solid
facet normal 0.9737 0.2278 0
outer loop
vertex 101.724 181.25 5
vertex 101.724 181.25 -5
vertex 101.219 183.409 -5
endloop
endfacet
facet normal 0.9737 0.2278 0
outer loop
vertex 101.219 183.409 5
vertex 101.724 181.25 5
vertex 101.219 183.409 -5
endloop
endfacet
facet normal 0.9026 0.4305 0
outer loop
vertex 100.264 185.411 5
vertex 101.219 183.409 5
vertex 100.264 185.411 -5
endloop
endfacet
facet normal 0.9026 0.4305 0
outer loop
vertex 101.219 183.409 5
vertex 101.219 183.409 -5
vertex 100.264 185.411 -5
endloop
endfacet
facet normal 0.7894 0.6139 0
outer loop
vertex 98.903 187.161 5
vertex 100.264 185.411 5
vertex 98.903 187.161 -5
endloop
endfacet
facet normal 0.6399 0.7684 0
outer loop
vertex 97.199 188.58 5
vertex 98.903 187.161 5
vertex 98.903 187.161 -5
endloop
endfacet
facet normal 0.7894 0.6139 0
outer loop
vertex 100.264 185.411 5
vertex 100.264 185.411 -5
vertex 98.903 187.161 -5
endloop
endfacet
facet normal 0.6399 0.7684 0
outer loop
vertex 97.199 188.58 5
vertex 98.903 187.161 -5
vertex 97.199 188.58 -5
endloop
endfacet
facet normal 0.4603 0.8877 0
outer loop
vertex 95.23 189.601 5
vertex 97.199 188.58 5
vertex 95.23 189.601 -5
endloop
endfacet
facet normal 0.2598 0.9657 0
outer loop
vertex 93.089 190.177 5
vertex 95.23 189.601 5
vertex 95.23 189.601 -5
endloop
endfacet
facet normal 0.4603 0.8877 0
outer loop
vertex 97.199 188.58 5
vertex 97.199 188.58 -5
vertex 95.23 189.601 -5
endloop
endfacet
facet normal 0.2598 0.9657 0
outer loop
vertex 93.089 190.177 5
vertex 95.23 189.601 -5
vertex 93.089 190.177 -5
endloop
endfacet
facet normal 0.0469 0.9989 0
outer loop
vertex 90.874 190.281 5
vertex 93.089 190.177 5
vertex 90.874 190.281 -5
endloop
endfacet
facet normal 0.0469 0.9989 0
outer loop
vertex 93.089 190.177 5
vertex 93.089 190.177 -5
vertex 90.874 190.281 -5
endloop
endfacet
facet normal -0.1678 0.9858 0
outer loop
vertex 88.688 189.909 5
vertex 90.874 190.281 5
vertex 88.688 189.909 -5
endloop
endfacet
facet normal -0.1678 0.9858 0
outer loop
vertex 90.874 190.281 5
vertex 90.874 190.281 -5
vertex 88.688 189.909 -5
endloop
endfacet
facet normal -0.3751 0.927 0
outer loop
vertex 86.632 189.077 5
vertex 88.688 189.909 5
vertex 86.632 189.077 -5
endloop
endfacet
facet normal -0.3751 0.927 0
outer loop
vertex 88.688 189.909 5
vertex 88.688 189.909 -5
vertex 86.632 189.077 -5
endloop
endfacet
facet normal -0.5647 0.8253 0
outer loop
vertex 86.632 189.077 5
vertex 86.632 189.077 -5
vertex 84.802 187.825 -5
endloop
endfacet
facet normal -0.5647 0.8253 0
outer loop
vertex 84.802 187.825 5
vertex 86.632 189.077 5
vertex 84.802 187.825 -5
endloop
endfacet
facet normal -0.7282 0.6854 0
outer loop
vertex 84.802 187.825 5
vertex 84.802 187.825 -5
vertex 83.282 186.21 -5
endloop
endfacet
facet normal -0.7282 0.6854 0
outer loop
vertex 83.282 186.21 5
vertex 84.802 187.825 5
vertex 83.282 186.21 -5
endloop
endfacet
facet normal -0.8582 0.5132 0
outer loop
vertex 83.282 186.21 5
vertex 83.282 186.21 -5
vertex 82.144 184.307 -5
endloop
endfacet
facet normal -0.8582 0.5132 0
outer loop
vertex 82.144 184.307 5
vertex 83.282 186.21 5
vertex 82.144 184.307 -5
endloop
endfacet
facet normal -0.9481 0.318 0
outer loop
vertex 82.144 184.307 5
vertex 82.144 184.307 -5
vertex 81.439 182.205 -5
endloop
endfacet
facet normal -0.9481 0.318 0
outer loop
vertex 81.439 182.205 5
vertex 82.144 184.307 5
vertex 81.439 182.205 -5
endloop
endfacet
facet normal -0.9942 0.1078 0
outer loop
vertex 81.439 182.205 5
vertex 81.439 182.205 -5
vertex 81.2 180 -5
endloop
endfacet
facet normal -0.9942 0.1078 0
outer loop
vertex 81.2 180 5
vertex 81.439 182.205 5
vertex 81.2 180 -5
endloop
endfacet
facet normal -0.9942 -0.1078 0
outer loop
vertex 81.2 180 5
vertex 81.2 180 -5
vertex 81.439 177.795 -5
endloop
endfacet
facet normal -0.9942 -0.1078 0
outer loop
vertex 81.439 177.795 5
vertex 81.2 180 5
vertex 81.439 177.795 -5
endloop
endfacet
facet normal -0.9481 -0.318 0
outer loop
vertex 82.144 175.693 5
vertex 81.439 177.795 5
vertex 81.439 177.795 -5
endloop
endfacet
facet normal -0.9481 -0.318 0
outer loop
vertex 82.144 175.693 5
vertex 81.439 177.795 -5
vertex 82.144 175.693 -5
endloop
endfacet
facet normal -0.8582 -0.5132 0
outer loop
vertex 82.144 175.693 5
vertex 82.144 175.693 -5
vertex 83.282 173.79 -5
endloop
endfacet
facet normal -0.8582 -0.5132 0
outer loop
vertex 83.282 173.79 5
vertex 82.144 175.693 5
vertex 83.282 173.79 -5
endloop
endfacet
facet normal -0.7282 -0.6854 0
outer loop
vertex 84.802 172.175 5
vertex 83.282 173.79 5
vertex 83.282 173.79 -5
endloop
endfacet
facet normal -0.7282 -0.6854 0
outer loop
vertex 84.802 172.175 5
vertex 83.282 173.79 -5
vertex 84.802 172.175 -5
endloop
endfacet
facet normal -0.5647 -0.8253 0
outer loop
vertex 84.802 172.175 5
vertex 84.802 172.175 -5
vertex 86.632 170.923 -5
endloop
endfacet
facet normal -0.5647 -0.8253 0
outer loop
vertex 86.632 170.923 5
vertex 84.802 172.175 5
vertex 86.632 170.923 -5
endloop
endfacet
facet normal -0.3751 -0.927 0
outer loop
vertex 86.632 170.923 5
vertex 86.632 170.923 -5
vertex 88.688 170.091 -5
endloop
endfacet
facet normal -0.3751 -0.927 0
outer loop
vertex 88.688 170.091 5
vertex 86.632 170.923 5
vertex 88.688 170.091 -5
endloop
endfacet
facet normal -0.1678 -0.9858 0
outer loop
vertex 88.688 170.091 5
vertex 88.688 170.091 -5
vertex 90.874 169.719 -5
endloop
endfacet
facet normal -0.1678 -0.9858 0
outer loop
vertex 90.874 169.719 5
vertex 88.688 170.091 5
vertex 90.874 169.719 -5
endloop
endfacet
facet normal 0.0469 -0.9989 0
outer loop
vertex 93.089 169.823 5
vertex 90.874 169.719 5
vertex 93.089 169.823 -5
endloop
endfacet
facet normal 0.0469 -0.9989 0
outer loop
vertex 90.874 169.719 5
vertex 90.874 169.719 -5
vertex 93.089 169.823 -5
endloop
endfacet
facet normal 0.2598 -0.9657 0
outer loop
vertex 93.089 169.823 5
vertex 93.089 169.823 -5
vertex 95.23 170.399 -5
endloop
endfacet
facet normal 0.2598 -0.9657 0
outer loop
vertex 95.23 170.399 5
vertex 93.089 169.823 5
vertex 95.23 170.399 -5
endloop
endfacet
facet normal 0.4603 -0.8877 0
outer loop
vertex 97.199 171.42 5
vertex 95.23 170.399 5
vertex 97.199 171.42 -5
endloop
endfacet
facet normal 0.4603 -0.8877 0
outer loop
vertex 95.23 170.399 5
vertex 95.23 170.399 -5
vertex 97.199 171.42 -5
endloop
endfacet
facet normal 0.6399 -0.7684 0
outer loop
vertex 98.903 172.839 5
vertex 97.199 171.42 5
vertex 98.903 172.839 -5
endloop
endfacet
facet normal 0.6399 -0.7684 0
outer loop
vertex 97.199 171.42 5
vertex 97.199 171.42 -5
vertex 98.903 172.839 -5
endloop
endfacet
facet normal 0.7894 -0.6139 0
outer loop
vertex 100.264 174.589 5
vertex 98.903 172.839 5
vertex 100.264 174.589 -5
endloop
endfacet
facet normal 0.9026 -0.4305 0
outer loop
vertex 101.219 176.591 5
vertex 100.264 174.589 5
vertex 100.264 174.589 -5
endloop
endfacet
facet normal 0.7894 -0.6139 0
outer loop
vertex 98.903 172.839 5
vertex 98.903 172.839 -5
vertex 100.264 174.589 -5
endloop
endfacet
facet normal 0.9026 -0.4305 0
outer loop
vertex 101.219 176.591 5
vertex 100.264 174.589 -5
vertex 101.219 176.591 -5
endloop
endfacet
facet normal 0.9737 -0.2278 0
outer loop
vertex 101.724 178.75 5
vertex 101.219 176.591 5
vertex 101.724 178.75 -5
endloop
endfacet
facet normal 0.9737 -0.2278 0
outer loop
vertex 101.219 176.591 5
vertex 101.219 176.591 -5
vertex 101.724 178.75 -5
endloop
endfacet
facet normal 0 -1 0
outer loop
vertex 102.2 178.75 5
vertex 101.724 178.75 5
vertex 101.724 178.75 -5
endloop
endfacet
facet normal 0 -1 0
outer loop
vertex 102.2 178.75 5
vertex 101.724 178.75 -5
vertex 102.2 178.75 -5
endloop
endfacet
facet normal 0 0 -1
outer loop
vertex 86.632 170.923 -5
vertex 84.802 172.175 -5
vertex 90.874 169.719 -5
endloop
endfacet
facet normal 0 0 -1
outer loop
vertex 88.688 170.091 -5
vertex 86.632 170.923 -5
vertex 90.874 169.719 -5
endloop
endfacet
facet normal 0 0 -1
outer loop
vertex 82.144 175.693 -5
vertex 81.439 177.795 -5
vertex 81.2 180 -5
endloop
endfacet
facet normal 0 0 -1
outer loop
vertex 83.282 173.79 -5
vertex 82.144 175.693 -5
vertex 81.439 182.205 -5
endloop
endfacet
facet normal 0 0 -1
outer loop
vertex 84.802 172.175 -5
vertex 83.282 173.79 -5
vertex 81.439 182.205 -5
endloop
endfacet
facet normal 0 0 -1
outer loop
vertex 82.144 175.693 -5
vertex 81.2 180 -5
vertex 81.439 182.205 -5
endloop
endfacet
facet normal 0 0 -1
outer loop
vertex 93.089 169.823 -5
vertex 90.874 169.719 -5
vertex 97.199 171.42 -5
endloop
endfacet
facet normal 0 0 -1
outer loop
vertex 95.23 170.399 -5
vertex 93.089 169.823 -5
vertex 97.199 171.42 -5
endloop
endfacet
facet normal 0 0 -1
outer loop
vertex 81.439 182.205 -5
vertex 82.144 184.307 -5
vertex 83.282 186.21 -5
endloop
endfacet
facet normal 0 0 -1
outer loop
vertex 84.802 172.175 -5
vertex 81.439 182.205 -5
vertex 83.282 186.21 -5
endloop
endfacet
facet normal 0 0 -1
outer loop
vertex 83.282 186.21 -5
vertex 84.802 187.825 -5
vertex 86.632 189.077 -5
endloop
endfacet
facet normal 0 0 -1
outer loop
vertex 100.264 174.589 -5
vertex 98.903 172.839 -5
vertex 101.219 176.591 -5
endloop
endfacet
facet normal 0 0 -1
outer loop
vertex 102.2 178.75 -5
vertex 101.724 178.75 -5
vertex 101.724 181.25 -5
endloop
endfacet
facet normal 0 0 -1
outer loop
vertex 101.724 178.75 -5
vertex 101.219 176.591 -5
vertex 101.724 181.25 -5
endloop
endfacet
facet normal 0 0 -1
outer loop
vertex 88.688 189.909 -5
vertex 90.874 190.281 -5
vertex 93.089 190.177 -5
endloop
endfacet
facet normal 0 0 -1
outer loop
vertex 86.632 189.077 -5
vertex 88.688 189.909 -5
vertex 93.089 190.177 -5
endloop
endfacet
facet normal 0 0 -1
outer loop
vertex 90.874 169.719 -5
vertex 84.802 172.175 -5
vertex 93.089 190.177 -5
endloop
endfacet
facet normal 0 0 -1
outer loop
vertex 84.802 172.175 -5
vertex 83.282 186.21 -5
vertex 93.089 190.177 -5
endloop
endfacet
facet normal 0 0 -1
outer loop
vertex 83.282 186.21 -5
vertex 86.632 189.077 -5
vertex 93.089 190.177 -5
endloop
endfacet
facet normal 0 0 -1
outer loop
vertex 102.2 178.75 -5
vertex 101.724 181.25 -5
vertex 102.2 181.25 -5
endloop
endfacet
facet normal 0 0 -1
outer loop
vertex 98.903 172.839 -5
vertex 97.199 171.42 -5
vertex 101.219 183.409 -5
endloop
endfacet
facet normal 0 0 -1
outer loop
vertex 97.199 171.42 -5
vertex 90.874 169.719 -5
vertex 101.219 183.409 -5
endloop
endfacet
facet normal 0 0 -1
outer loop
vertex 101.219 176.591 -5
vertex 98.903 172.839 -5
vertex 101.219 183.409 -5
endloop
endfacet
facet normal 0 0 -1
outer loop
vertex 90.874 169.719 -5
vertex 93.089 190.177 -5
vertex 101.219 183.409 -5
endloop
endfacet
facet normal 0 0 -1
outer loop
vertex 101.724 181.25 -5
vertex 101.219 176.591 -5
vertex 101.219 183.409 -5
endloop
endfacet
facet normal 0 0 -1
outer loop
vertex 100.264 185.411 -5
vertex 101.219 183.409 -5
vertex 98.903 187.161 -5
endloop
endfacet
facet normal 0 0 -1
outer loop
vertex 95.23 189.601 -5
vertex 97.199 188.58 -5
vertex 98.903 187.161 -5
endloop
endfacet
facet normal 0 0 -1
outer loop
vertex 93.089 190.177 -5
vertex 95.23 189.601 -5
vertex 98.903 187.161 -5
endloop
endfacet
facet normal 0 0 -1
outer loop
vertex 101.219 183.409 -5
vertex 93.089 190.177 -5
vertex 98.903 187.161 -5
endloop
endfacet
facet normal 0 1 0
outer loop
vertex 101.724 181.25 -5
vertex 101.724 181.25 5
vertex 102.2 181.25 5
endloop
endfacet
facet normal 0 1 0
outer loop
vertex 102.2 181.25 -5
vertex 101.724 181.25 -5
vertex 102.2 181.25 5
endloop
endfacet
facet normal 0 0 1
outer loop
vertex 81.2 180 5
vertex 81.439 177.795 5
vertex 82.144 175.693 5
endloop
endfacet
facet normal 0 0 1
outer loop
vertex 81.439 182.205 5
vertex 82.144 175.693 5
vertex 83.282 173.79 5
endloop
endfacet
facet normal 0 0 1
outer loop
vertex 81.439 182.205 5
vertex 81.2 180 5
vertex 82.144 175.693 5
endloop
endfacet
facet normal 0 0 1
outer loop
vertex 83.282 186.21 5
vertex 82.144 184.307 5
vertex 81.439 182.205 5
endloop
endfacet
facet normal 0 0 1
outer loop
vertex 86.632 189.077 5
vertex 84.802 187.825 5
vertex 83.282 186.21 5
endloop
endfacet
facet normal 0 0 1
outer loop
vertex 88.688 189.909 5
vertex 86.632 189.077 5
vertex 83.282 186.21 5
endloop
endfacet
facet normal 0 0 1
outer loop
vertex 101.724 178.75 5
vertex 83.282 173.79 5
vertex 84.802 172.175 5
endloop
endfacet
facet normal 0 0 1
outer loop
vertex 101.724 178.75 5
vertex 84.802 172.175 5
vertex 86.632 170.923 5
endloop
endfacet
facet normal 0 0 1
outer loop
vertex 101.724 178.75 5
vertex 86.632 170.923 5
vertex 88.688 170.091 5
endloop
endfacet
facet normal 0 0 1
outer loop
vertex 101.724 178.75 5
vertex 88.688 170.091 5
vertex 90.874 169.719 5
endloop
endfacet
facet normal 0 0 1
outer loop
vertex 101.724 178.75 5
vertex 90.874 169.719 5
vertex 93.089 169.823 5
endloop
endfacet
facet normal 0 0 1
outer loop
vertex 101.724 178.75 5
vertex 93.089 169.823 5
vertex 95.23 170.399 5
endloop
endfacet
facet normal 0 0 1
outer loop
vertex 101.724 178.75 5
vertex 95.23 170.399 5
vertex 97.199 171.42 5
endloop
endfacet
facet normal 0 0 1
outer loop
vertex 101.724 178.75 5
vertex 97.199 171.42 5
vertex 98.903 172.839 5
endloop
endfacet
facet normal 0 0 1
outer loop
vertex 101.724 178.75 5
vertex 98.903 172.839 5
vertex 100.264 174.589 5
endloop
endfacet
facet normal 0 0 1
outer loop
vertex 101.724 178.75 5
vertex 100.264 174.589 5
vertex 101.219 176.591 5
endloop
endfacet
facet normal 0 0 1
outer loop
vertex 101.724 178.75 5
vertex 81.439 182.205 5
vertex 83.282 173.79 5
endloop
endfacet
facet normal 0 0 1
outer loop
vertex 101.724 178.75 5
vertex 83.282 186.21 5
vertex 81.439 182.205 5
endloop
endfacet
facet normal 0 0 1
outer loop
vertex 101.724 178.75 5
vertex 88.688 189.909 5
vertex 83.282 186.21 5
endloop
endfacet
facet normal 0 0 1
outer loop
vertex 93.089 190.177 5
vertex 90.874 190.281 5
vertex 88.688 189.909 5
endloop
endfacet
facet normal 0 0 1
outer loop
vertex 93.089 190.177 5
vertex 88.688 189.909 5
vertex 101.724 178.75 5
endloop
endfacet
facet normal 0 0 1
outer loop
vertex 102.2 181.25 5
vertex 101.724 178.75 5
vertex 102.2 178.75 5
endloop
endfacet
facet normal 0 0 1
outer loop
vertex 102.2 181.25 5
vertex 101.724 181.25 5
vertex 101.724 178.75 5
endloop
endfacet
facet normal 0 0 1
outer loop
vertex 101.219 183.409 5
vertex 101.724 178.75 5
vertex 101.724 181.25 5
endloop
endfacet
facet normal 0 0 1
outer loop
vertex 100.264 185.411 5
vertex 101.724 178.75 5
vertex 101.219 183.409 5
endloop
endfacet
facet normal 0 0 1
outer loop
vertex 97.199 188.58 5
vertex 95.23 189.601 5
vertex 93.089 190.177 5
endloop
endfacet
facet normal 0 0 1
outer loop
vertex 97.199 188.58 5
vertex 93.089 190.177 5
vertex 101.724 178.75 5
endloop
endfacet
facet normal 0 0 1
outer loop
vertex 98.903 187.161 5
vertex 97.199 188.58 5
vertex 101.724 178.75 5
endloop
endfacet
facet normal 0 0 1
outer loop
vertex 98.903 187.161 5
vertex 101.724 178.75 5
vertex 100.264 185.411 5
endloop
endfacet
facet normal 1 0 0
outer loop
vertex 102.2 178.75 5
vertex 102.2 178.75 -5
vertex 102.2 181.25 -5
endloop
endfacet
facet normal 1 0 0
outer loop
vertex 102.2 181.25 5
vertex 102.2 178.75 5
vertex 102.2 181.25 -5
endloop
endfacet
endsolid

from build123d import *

# Parameters (mm, degrees)
BOX057_W          = 10
BOX057_H          = 2.5
BOX057_DEPTH      = 10
CYLINDER064_R     = 10.3
CYLINDER064_DEPTH = 10


with BuildPart() as cube056:
    # Box057 → Box057 (new body)
    with BuildSketch(Plane(origin=(85.7, 163.75, -5), x_dir=(1, 0, 0), z_dir=(0, 0, 1))):
        with Locations((5, 1.25)):
            Rectangle(BOX057_W, BOX057_H)
    extrude(amount=BOX057_DEPTH)


with BuildPart() as powersw002:
    # Cylinder064 → Cylinder064 (new body)
    with BuildSketch(Plane(origin=(85, 165, -5), x_dir=(1, 0, 0), z_dir=(0, 0, 1))):
        Circle(CYLINDER064_R)
    extrude(amount=CYLINDER064_DEPTH)

    # Fusion009: union Cube056
    add(cube056.part)


with BuildPart() as powersw002_1:
    # Fusion009 placement: moved
    add(powersw002.part.moved(Location((6.5, 15, 0))))


solid = powersw002_1.part
